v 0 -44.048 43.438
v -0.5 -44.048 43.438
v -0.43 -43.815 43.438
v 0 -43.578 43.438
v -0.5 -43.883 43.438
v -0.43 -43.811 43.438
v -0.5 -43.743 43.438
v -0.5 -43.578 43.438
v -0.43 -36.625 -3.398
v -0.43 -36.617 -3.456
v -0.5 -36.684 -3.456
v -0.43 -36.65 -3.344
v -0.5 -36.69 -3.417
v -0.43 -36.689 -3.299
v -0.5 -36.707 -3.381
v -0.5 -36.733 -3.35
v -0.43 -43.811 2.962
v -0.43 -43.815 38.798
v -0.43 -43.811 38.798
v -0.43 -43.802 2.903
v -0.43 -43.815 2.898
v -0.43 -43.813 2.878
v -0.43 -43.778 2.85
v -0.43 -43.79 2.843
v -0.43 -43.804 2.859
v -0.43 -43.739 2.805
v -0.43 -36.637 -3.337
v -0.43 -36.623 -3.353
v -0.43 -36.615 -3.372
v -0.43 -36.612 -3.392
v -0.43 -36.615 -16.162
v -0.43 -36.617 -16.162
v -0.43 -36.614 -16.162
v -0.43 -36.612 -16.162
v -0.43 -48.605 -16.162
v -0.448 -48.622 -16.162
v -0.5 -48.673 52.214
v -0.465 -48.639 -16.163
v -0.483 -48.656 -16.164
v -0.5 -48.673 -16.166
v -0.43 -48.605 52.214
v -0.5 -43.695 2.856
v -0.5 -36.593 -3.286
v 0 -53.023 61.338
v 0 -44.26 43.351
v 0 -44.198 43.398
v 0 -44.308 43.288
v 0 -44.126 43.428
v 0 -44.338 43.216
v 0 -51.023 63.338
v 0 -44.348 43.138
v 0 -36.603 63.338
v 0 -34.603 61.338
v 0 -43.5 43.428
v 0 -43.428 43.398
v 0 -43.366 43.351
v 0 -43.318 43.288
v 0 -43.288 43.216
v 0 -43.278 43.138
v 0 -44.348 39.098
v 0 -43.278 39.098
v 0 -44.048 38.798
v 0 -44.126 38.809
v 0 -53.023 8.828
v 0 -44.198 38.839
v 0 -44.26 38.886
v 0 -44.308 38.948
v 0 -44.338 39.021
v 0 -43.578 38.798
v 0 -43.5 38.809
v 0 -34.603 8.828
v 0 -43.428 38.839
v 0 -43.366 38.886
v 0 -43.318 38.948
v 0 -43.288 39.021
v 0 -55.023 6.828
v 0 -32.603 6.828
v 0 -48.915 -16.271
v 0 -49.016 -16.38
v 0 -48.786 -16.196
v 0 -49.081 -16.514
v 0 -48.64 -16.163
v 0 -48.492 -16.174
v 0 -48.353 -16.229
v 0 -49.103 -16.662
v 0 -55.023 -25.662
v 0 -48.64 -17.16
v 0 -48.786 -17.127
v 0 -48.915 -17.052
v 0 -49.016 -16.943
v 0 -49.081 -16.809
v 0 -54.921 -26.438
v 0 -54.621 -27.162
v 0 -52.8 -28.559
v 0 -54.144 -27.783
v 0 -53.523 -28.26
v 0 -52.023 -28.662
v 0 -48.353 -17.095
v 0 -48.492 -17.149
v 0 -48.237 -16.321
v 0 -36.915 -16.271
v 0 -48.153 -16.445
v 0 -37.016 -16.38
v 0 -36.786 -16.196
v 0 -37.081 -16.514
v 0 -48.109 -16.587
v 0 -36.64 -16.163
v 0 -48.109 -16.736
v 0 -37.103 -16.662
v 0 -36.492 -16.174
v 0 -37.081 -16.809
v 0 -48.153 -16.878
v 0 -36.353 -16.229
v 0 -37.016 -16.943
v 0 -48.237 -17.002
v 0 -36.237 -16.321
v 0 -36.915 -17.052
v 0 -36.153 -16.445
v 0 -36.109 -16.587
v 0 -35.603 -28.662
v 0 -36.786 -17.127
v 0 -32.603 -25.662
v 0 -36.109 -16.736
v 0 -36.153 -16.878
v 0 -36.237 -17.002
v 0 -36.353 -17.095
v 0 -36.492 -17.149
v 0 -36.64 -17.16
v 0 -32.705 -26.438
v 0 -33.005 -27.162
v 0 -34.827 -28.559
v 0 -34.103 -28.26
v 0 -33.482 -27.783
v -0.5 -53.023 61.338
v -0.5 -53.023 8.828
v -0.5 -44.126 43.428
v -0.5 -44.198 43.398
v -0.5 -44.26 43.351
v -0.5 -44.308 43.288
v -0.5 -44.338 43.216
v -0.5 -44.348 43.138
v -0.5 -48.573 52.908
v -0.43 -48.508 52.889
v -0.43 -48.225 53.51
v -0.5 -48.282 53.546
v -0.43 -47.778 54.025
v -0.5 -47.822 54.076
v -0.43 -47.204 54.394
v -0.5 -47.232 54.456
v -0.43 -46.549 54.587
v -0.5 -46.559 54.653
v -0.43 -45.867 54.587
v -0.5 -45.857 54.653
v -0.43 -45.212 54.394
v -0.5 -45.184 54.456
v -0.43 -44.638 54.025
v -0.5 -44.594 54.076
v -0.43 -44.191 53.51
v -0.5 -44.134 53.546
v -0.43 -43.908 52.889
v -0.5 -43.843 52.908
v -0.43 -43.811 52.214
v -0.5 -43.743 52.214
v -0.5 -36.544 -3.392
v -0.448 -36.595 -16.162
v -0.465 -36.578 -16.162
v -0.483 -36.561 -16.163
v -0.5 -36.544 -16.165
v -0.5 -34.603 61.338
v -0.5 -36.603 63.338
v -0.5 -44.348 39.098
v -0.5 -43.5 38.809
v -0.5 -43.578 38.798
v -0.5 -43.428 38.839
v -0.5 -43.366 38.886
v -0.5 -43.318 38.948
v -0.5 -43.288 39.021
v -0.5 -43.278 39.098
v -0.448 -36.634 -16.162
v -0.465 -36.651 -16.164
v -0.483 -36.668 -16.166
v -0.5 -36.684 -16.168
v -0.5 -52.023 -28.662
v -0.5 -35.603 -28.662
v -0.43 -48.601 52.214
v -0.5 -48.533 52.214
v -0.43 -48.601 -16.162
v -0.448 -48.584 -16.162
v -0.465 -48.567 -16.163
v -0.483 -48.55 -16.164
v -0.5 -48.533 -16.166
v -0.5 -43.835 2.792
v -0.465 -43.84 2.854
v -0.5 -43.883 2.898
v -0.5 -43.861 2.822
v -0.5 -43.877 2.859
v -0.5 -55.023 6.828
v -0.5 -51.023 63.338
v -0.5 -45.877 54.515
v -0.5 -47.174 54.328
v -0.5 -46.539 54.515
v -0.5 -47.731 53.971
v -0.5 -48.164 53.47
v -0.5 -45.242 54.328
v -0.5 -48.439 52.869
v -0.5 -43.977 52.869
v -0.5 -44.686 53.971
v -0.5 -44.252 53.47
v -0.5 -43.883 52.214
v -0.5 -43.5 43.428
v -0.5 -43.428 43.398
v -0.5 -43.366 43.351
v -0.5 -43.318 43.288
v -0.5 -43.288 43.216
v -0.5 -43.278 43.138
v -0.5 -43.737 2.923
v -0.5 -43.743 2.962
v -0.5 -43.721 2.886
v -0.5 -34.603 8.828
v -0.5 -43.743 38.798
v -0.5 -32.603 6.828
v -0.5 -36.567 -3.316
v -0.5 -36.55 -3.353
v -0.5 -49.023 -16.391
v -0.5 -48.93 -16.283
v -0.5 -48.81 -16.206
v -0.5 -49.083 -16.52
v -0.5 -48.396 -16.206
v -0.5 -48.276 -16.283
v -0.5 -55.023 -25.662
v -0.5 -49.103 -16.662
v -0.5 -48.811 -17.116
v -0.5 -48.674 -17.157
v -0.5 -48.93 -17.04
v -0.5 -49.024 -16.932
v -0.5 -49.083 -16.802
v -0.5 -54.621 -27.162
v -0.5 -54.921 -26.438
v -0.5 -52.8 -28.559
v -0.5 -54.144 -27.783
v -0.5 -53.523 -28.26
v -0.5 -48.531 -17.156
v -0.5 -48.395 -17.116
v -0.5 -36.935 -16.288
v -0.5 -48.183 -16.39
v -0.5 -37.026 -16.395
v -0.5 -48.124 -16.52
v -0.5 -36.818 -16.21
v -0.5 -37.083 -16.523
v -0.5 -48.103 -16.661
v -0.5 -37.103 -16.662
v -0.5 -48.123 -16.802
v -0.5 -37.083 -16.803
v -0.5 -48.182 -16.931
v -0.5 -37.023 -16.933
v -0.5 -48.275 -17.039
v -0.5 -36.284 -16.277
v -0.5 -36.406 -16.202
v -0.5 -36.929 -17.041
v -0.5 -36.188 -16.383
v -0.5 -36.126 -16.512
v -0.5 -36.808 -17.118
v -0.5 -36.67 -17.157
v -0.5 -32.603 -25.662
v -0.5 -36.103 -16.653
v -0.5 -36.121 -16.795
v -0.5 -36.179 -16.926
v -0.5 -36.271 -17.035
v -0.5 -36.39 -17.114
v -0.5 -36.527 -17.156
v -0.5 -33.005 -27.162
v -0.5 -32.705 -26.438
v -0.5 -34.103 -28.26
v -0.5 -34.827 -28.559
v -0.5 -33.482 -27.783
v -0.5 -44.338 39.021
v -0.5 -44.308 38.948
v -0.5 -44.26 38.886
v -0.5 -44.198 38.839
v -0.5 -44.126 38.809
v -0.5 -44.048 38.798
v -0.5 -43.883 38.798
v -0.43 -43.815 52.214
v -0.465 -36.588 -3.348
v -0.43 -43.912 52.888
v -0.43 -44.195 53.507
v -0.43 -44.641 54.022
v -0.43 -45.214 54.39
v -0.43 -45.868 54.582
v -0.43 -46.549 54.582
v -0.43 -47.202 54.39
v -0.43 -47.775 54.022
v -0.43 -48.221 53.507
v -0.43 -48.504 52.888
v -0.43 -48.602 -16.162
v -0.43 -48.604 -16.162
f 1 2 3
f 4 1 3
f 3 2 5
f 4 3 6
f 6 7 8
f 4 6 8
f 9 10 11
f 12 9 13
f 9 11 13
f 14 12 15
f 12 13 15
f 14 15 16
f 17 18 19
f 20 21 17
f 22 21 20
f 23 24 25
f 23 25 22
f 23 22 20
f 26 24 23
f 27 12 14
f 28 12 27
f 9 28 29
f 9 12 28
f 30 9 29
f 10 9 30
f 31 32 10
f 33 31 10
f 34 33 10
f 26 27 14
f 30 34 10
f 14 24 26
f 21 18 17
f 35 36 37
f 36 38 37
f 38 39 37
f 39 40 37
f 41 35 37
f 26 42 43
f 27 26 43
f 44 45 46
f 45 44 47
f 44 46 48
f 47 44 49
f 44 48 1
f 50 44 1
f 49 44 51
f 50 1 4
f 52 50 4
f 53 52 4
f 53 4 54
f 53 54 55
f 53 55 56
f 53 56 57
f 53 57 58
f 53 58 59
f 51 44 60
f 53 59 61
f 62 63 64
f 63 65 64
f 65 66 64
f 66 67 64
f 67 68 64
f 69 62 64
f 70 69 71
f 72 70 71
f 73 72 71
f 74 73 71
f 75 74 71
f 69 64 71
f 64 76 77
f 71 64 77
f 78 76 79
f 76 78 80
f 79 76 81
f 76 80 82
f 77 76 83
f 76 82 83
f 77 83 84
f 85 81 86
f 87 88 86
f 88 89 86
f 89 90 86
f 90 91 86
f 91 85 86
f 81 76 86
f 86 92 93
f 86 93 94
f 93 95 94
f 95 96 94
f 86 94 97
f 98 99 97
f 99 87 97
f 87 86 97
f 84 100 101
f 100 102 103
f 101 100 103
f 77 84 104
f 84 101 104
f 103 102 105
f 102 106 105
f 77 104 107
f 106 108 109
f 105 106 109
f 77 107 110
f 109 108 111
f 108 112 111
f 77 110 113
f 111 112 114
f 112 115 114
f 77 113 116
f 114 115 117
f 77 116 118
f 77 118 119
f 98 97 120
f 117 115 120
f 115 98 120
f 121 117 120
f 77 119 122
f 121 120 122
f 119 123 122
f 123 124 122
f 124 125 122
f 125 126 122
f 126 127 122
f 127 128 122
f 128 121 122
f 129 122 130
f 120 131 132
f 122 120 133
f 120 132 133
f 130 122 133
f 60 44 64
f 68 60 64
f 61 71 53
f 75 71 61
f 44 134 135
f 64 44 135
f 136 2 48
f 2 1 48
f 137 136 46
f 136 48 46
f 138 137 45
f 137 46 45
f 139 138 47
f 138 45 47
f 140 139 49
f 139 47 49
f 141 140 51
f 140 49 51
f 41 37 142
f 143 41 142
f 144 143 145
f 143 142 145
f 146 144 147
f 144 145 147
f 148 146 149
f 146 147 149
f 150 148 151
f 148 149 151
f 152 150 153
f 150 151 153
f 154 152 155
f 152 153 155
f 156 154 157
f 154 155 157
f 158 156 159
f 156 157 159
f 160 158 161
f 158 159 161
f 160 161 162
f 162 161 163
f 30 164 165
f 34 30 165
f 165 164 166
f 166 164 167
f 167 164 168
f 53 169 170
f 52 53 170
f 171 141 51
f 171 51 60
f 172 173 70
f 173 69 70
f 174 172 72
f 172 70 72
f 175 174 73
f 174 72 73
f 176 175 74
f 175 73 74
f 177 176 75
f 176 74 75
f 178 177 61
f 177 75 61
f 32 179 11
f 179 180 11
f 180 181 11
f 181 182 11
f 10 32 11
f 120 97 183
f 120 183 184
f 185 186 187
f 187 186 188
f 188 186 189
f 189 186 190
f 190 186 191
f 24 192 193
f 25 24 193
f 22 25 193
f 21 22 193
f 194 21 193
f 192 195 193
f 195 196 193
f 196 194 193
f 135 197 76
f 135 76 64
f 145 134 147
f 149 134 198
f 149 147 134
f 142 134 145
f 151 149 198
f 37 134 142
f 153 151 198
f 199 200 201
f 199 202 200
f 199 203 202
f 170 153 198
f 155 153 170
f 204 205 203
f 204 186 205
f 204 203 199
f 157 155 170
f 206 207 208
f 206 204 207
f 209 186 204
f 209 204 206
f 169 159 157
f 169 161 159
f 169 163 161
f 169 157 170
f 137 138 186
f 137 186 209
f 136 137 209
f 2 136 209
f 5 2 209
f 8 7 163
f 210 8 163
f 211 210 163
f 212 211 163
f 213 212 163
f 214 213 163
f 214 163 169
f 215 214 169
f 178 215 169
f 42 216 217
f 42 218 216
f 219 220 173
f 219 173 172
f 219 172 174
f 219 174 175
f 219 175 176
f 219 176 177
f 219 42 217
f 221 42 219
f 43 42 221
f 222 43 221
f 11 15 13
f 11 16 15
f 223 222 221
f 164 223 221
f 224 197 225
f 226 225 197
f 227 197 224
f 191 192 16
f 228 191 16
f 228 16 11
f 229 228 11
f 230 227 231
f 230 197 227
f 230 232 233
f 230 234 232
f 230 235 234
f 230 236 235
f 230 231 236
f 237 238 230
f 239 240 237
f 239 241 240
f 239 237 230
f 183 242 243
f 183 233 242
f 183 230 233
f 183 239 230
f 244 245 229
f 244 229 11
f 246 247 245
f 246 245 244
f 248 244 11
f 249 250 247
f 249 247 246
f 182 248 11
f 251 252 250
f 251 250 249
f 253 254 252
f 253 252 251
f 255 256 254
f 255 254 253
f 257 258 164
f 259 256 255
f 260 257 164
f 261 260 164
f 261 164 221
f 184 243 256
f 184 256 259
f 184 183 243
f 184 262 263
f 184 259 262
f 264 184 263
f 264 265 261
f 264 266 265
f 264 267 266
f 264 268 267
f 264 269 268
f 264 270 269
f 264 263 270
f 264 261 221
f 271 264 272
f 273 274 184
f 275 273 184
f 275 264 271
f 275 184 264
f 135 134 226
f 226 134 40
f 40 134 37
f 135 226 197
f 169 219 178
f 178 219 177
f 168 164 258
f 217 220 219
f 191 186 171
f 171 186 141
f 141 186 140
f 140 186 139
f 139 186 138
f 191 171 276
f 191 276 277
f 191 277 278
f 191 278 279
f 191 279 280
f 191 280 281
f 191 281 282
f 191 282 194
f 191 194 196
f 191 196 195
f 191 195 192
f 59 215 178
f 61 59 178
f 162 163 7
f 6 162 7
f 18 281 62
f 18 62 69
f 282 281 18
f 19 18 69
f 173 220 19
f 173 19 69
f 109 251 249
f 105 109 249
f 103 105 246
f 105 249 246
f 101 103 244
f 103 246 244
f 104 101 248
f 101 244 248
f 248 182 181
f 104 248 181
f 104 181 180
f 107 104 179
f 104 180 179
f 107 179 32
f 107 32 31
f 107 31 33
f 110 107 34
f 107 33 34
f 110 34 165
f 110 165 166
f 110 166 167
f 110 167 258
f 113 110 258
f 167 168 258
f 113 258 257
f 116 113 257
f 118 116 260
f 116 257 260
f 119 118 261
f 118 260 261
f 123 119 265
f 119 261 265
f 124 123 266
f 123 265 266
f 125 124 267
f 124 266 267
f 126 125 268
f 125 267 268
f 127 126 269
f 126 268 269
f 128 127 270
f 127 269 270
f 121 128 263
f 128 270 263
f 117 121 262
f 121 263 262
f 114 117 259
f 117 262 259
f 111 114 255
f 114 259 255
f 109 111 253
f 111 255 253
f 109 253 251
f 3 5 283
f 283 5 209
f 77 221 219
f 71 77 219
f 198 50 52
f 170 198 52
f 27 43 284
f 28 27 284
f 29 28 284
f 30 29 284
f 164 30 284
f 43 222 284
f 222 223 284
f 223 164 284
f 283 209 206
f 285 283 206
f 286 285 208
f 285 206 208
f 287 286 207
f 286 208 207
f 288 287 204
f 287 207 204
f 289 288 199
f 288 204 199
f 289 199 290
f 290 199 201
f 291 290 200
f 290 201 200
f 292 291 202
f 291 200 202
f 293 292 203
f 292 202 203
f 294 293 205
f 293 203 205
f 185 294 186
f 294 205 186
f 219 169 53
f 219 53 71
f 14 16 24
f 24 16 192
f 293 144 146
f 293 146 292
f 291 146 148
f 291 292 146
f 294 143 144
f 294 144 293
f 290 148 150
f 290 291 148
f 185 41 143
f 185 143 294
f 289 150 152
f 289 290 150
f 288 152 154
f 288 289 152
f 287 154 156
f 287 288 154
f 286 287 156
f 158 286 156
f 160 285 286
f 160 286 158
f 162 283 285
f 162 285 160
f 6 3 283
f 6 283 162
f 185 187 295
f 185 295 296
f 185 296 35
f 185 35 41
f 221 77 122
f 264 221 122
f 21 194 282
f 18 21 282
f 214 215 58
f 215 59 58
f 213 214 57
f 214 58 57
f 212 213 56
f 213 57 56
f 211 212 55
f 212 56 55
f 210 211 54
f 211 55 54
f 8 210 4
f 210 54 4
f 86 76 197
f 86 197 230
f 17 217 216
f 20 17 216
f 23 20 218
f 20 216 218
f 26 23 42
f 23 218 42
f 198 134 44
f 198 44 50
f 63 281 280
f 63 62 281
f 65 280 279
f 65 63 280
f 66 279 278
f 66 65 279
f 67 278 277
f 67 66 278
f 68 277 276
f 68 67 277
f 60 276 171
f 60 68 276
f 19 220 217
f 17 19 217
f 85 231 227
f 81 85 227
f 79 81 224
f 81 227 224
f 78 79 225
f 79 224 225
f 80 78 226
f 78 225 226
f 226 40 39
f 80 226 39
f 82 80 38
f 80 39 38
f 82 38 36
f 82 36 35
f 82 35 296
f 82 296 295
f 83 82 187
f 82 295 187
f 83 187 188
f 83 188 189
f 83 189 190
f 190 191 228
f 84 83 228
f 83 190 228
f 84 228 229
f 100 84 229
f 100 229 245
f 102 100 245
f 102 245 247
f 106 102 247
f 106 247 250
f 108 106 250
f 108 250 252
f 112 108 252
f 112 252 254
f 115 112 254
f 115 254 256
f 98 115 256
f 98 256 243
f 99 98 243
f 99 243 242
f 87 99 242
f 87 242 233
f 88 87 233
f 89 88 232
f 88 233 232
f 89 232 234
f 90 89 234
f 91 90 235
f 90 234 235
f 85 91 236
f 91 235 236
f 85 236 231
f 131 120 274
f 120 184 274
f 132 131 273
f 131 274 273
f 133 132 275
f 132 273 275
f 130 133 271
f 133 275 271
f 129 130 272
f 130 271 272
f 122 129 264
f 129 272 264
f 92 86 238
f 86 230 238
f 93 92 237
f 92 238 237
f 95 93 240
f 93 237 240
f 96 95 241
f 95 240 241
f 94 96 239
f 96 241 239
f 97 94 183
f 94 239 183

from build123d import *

# Parameters (mm, degrees)
SKETCH2_W           = 22.42
SKETCH2_H           = 92
BOSS_EXTRUDE2_DEPTH = 0.5
FILLET4_R           = 3
FILLET7_R           = 3
SKETCH4_W           = 2
SKETCH4_H           = 54.51
CUT_EXTRUDE1_DEPTH  = 0.5
SKETCH5_W           = 2
SKETCH5_H           = 54.51
CUT_EXTRUDE2_DEPTH  = 0.5
CUT_EXTRUDE3_DEPTH  = 0.5
CUT_EXTRUDE4_DEPTH  = 0.5
CUT_EXTRUDE7_DEPTH  = 0.5
CUT_EXTRUDE8_DEPTH  = 0.5
SKETCH11_W          = 1.07
SKETCH11_H          = 4.64
CUT_EXTRUDE9_DEPTH  = 0.5
FILLET8_R           = 0.3
FILLET9_R           = 0.3
FILLET10_R          = 0.3
FILLET11_R          = 0.3
SKETCH12_R          = 0.5
CUT_EXTRUDE11_DEPTH = 0.5
SKETCH13_R          = 0.5
CUT_EXTRUDE12_DEPTH = 5
CUT_EXTRUDE24_DEPTH = 0.07
CUT_EXTRUDE24_DRAFT = -44


with BuildPart() as part:
    # Sketch2 → Boss-Extrude2 (new body)
    with BuildSketch(Plane(origin=(0, 0, 0), x_dir=(0, 1, 0), z_dir=(-1, 0, 0))):
        with Locations((-43.813076923, -17.338461538)):
            Rectangle(SKETCH2_W, SKETCH2_H)
    extrude(amount=BOSS_EXTRUDE2_DEPTH)

    # Fillet4
    fillet4_edges = [part.edges().sort_by_distance(p)[0] for p in [
        (-0.25, -55.023076923, -28.661538462),
    ]]
    fillet(fillet4_edges, radius=FILLET4_R)

    # Fillet7
    fillet7_edges = [part.edges().sort_by_distance(p)[0] for p in [
        (-0.25, -32.603076923, -28.661538462),
    ]]
    fillet(fillet7_edges, radius=FILLET7_R)

    # Sketch4 → Cut-Extrude1 (cut)
    with BuildSketch(Plane(origin=(-0.5, 0, 0), x_dir=(0, 1, 0), z_dir=(-1, 0, 0))):
        with Locations((-54.023076923, -36.083461538)):
            Rectangle(SKETCH4_W, SKETCH4_H)
    extrude(amount=-CUT_EXTRUDE1_DEPTH, mode=Mode.SUBTRACT)

    # Sketch5 → Cut-Extrude2 (cut)
    with BuildSketch(Plane(origin=(-0.5, 0, 0), x_dir=(0, 1, 0), z_dir=(-1, 0, 0))):
        with Locations((-33.603076923, -36.083461538)):
            Rectangle(SKETCH5_W, SKETCH5_H)
    extrude(amount=-CUT_EXTRUDE2_DEPTH, mode=Mode.SUBTRACT)

    # Sketch6 → Cut-Extrude3 (cut)
    with BuildSketch(Plane(origin=(-0.5, 0, 0), x_dir=(0, 1, 0), z_dir=(-1, 0, 0))):
        Polygon((-53.023076923, -63.338461538), (-53.023076923, -61.338461538), (-51.023076923, -63.338461538), align=None)
    extrude(amount=-CUT_EXTRUDE3_DEPTH, mode=Mode.SUBTRACT)

    # Sketch7 → Cut-Extrude4 (cut)
    with BuildSketch(Plane(origin=(-0.5, 0, 0), x_dir=(0, 1, 0), z_dir=(-1, 0, 0))):
        Polygon((-34.603076923, -63.338461538), (-34.603076923, -61.338461538), (-36.603076923, -63.338461538), align=None)
    extrude(amount=-CUT_EXTRUDE4_DEPTH, mode=Mode.SUBTRACT)

    # Sketch8 → Cut-Extrude7 (cut)
    with BuildSketch(Plane(origin=(-0.5, 0, 0), x_dir=(0, 1, 0), z_dir=(-1, 0, 0))):
        Polygon((-53.023076923, -8.828461538), (-55.023076923, -8.828461538), (-55.023076923, -6.828461538), align=None)
    extrude(amount=-CUT_EXTRUDE7_DEPTH, mode=Mode.SUBTRACT)

    # Sketch9 → Cut-Extrude8 (cut)
    with BuildSketch(Plane(origin=(-0.5, 0, 0), x_dir=(0, 1, 0), z_dir=(-1, 0, 0))):
        Polygon((-34.603076923, -8.828461538), (-32.603076923, -8.828461538), (-32.603076923, -6.828461538), align=None)
    extrude(amount=-CUT_EXTRUDE8_DEPTH, mode=Mode.SUBTRACT)

    # Sketch11 → Cut-Extrude9 (cut)
    with BuildSketch(Plane(origin=(-0.5, 0, 0), x_dir=(0, 1, 0), z_dir=(-1, 0, 0))):
        with Locations((-43.813076923, -41.118461538)):
            Rectangle(SKETCH11_W, SKETCH11_H)
    extrude(amount=-CUT_EXTRUDE9_DEPTH, mode=Mode.SUBTRACT)

    # Fillet8
    fillet8_edges = [part.edges().sort_by_distance(p)[0] for p in [
        (-0.25, -44.348076923, 38.798461538),
    ]]
    fillet(fillet8_edges, radius=FILLET8_R)

    # Fillet9
    fillet9_edges = [part.edges().sort_by_distance(p)[0] for p in [
        (-0.25, -43.278076923, 38.798461538),
    ]]
    fillet(fillet9_edges, radius=FILLET9_R)

    # Fillet10
    fillet10_edges = [part.edges().sort_by_distance(p)[0] for p in [
        (-0.25, -43.278076923, 43.438461538),
    ]]
    fillet(fillet10_edges, radius=FILLET10_R)

    # Fillet11
    fillet11_edges = [part.edges().sort_by_distance(p)[0] for p in [
        (-0.25, -44.348076923, 43.438461538),
    ]]
    fillet(fillet11_edges, radius=FILLET11_R)

    # Sketch12 → Cut-Extrude11 (cut)
    with BuildSketch(Plane(origin=(-0.5, 0, 0), x_dir=(0, 1, 0), z_dir=(-1, 0, 0))):
        with Locations(Location((-36.603076923, 16.661538462, 0), (0, 0, 180))):
            Circle(SKETCH12_R)
    extrude(amount=-CUT_EXTRUDE11_DEPTH, mode=Mode.SUBTRACT)

    # Sketch13 → Cut-Extrude12 (cut)
    with BuildSketch(Plane(origin=(-0.5, 0, 0), x_dir=(0, 1, 0), z_dir=(-1, 0, 0))):
        with Locations(Location((-48.603076923, 16.661538462, 0), (0, 0, 180))):
            Circle(SKETCH13_R)
    extrude(amount=-CUT_EXTRUDE12_DEPTH, mode=Mode.SUBTRACT)


with BuildPart() as cut_extrude24_tool:
    # Sketch25 → Cut-Extrude24 (with draft: the straight prism first)
    with BuildSketch(Plane(origin=(-0.5, 0, 0), x_dir=(0, 1, 0), z_dir=(-1, 0, 0))):
        with BuildLine():
            ThreePointArc((-36.592742355, 3.286363935), (-36.557004391, 3.334036273), (-36.544326341, 3.39225243))
            Line((-36.544326341, 3.39225243), (-36.544326341, 16.851858083))
            Line((-36.544326341, 16.851858083), (-36.684326341, 16.851858083))
            Line((-36.684326341, 16.851858083), (-36.684326341, 3.456265446))
            ThreePointArc((-36.684326341, 3.456265446), (-36.697004391, 3.398049289), (-36.732742355, 3.350376951))
            Line((-36.732742355, 3.350376951), (-43.834660909, -2.792141227))
            ThreePointArc((-43.834660909, -2.792141227), (-43.870398873, -2.839813565), (-43.883076923, -2.898029723))
            Line((-43.883076923, -2.898029723), (-43.883076923, -52.213504668))
            ThreePointArc((-43.883076923, -52.213504668), (-46.208076923, -54.538504668), (-48.533076923, -52.213504668))
            Line((-48.533076923, -52.213504668), (-48.533076923, 16.646534236))
            Line((-48.533076923, 16.646534236), (-48.673076923, 16.646534236))
            Line((-48.673076923, 16.646534236), (-48.673076923, -52.213504668))
            ThreePointArc((-48.673076923, -52.213504668), (-46.208076923, -54.678504668), (-43.743076923, -52.213504668))
            Line((-43.743076923, -52.213504668), (-43.743076923, -2.962042739))
            ThreePointArc((-43.743076923, -2.962042739), (-43.730398873, -2.903826581), (-43.694660909, -2.856154243))
            Line((-43.694660909, -2.856154243), (-36.592742355, 3.286363935))
        make_face()
    extrude(amount=-CUT_EXTRUDE24_DEPTH)
    # Cut-Extrude24: the draft: its side faces are tilted about the plane it starts from
    cut_extrude24_sides = [cut_extrude24_tool.faces().sort_by_distance(p)[0] for p in [
        (-0.465, -40.143701632, -0.215104846),
        (-0.465, -36.557004391, -3.334036273),
        (-0.465, -36.544326341, -10.122055257),
        (-0.465, -36.614326341, -16.851858083),
        (-0.465, -36.684326341, -10.154061765),
        (-0.465, -36.697004391, -3.398049289),
        (-0.465, -40.283701632, -0.279117862),
        (-0.465, -43.870398873, 2.839813565),
        (-0.465, -43.883076923, 27.555767195),
        (-0.465, -46.208076923, 54.538504668),
        (-0.465, -48.533076923, 17.783485216),
        (-0.465, -48.603076923, -16.646534236),
        (-0.465, -48.673076923, 17.783485216),
        (-0.465, -46.208076923, 54.678504668),
        (-0.465, -43.743076923, 27.587773703),
        (-0.465, -43.730398873, 2.903826581),
    ]]
    draft(cut_extrude24_sides, Plane(origin=(-0.5, 0, 0), x_dir=(0, 1, 0), z_dir=(-1, 0, 0)), CUT_EXTRUDE24_DRAFT)


with BuildPart() as part_1:
    add(part.part)

    # Cut-Extrude24: cut by cut_extrude24_tool
    add(cut_extrude24_tool.part, mode=Mode.SUBTRACT)


solid = part_1.part
